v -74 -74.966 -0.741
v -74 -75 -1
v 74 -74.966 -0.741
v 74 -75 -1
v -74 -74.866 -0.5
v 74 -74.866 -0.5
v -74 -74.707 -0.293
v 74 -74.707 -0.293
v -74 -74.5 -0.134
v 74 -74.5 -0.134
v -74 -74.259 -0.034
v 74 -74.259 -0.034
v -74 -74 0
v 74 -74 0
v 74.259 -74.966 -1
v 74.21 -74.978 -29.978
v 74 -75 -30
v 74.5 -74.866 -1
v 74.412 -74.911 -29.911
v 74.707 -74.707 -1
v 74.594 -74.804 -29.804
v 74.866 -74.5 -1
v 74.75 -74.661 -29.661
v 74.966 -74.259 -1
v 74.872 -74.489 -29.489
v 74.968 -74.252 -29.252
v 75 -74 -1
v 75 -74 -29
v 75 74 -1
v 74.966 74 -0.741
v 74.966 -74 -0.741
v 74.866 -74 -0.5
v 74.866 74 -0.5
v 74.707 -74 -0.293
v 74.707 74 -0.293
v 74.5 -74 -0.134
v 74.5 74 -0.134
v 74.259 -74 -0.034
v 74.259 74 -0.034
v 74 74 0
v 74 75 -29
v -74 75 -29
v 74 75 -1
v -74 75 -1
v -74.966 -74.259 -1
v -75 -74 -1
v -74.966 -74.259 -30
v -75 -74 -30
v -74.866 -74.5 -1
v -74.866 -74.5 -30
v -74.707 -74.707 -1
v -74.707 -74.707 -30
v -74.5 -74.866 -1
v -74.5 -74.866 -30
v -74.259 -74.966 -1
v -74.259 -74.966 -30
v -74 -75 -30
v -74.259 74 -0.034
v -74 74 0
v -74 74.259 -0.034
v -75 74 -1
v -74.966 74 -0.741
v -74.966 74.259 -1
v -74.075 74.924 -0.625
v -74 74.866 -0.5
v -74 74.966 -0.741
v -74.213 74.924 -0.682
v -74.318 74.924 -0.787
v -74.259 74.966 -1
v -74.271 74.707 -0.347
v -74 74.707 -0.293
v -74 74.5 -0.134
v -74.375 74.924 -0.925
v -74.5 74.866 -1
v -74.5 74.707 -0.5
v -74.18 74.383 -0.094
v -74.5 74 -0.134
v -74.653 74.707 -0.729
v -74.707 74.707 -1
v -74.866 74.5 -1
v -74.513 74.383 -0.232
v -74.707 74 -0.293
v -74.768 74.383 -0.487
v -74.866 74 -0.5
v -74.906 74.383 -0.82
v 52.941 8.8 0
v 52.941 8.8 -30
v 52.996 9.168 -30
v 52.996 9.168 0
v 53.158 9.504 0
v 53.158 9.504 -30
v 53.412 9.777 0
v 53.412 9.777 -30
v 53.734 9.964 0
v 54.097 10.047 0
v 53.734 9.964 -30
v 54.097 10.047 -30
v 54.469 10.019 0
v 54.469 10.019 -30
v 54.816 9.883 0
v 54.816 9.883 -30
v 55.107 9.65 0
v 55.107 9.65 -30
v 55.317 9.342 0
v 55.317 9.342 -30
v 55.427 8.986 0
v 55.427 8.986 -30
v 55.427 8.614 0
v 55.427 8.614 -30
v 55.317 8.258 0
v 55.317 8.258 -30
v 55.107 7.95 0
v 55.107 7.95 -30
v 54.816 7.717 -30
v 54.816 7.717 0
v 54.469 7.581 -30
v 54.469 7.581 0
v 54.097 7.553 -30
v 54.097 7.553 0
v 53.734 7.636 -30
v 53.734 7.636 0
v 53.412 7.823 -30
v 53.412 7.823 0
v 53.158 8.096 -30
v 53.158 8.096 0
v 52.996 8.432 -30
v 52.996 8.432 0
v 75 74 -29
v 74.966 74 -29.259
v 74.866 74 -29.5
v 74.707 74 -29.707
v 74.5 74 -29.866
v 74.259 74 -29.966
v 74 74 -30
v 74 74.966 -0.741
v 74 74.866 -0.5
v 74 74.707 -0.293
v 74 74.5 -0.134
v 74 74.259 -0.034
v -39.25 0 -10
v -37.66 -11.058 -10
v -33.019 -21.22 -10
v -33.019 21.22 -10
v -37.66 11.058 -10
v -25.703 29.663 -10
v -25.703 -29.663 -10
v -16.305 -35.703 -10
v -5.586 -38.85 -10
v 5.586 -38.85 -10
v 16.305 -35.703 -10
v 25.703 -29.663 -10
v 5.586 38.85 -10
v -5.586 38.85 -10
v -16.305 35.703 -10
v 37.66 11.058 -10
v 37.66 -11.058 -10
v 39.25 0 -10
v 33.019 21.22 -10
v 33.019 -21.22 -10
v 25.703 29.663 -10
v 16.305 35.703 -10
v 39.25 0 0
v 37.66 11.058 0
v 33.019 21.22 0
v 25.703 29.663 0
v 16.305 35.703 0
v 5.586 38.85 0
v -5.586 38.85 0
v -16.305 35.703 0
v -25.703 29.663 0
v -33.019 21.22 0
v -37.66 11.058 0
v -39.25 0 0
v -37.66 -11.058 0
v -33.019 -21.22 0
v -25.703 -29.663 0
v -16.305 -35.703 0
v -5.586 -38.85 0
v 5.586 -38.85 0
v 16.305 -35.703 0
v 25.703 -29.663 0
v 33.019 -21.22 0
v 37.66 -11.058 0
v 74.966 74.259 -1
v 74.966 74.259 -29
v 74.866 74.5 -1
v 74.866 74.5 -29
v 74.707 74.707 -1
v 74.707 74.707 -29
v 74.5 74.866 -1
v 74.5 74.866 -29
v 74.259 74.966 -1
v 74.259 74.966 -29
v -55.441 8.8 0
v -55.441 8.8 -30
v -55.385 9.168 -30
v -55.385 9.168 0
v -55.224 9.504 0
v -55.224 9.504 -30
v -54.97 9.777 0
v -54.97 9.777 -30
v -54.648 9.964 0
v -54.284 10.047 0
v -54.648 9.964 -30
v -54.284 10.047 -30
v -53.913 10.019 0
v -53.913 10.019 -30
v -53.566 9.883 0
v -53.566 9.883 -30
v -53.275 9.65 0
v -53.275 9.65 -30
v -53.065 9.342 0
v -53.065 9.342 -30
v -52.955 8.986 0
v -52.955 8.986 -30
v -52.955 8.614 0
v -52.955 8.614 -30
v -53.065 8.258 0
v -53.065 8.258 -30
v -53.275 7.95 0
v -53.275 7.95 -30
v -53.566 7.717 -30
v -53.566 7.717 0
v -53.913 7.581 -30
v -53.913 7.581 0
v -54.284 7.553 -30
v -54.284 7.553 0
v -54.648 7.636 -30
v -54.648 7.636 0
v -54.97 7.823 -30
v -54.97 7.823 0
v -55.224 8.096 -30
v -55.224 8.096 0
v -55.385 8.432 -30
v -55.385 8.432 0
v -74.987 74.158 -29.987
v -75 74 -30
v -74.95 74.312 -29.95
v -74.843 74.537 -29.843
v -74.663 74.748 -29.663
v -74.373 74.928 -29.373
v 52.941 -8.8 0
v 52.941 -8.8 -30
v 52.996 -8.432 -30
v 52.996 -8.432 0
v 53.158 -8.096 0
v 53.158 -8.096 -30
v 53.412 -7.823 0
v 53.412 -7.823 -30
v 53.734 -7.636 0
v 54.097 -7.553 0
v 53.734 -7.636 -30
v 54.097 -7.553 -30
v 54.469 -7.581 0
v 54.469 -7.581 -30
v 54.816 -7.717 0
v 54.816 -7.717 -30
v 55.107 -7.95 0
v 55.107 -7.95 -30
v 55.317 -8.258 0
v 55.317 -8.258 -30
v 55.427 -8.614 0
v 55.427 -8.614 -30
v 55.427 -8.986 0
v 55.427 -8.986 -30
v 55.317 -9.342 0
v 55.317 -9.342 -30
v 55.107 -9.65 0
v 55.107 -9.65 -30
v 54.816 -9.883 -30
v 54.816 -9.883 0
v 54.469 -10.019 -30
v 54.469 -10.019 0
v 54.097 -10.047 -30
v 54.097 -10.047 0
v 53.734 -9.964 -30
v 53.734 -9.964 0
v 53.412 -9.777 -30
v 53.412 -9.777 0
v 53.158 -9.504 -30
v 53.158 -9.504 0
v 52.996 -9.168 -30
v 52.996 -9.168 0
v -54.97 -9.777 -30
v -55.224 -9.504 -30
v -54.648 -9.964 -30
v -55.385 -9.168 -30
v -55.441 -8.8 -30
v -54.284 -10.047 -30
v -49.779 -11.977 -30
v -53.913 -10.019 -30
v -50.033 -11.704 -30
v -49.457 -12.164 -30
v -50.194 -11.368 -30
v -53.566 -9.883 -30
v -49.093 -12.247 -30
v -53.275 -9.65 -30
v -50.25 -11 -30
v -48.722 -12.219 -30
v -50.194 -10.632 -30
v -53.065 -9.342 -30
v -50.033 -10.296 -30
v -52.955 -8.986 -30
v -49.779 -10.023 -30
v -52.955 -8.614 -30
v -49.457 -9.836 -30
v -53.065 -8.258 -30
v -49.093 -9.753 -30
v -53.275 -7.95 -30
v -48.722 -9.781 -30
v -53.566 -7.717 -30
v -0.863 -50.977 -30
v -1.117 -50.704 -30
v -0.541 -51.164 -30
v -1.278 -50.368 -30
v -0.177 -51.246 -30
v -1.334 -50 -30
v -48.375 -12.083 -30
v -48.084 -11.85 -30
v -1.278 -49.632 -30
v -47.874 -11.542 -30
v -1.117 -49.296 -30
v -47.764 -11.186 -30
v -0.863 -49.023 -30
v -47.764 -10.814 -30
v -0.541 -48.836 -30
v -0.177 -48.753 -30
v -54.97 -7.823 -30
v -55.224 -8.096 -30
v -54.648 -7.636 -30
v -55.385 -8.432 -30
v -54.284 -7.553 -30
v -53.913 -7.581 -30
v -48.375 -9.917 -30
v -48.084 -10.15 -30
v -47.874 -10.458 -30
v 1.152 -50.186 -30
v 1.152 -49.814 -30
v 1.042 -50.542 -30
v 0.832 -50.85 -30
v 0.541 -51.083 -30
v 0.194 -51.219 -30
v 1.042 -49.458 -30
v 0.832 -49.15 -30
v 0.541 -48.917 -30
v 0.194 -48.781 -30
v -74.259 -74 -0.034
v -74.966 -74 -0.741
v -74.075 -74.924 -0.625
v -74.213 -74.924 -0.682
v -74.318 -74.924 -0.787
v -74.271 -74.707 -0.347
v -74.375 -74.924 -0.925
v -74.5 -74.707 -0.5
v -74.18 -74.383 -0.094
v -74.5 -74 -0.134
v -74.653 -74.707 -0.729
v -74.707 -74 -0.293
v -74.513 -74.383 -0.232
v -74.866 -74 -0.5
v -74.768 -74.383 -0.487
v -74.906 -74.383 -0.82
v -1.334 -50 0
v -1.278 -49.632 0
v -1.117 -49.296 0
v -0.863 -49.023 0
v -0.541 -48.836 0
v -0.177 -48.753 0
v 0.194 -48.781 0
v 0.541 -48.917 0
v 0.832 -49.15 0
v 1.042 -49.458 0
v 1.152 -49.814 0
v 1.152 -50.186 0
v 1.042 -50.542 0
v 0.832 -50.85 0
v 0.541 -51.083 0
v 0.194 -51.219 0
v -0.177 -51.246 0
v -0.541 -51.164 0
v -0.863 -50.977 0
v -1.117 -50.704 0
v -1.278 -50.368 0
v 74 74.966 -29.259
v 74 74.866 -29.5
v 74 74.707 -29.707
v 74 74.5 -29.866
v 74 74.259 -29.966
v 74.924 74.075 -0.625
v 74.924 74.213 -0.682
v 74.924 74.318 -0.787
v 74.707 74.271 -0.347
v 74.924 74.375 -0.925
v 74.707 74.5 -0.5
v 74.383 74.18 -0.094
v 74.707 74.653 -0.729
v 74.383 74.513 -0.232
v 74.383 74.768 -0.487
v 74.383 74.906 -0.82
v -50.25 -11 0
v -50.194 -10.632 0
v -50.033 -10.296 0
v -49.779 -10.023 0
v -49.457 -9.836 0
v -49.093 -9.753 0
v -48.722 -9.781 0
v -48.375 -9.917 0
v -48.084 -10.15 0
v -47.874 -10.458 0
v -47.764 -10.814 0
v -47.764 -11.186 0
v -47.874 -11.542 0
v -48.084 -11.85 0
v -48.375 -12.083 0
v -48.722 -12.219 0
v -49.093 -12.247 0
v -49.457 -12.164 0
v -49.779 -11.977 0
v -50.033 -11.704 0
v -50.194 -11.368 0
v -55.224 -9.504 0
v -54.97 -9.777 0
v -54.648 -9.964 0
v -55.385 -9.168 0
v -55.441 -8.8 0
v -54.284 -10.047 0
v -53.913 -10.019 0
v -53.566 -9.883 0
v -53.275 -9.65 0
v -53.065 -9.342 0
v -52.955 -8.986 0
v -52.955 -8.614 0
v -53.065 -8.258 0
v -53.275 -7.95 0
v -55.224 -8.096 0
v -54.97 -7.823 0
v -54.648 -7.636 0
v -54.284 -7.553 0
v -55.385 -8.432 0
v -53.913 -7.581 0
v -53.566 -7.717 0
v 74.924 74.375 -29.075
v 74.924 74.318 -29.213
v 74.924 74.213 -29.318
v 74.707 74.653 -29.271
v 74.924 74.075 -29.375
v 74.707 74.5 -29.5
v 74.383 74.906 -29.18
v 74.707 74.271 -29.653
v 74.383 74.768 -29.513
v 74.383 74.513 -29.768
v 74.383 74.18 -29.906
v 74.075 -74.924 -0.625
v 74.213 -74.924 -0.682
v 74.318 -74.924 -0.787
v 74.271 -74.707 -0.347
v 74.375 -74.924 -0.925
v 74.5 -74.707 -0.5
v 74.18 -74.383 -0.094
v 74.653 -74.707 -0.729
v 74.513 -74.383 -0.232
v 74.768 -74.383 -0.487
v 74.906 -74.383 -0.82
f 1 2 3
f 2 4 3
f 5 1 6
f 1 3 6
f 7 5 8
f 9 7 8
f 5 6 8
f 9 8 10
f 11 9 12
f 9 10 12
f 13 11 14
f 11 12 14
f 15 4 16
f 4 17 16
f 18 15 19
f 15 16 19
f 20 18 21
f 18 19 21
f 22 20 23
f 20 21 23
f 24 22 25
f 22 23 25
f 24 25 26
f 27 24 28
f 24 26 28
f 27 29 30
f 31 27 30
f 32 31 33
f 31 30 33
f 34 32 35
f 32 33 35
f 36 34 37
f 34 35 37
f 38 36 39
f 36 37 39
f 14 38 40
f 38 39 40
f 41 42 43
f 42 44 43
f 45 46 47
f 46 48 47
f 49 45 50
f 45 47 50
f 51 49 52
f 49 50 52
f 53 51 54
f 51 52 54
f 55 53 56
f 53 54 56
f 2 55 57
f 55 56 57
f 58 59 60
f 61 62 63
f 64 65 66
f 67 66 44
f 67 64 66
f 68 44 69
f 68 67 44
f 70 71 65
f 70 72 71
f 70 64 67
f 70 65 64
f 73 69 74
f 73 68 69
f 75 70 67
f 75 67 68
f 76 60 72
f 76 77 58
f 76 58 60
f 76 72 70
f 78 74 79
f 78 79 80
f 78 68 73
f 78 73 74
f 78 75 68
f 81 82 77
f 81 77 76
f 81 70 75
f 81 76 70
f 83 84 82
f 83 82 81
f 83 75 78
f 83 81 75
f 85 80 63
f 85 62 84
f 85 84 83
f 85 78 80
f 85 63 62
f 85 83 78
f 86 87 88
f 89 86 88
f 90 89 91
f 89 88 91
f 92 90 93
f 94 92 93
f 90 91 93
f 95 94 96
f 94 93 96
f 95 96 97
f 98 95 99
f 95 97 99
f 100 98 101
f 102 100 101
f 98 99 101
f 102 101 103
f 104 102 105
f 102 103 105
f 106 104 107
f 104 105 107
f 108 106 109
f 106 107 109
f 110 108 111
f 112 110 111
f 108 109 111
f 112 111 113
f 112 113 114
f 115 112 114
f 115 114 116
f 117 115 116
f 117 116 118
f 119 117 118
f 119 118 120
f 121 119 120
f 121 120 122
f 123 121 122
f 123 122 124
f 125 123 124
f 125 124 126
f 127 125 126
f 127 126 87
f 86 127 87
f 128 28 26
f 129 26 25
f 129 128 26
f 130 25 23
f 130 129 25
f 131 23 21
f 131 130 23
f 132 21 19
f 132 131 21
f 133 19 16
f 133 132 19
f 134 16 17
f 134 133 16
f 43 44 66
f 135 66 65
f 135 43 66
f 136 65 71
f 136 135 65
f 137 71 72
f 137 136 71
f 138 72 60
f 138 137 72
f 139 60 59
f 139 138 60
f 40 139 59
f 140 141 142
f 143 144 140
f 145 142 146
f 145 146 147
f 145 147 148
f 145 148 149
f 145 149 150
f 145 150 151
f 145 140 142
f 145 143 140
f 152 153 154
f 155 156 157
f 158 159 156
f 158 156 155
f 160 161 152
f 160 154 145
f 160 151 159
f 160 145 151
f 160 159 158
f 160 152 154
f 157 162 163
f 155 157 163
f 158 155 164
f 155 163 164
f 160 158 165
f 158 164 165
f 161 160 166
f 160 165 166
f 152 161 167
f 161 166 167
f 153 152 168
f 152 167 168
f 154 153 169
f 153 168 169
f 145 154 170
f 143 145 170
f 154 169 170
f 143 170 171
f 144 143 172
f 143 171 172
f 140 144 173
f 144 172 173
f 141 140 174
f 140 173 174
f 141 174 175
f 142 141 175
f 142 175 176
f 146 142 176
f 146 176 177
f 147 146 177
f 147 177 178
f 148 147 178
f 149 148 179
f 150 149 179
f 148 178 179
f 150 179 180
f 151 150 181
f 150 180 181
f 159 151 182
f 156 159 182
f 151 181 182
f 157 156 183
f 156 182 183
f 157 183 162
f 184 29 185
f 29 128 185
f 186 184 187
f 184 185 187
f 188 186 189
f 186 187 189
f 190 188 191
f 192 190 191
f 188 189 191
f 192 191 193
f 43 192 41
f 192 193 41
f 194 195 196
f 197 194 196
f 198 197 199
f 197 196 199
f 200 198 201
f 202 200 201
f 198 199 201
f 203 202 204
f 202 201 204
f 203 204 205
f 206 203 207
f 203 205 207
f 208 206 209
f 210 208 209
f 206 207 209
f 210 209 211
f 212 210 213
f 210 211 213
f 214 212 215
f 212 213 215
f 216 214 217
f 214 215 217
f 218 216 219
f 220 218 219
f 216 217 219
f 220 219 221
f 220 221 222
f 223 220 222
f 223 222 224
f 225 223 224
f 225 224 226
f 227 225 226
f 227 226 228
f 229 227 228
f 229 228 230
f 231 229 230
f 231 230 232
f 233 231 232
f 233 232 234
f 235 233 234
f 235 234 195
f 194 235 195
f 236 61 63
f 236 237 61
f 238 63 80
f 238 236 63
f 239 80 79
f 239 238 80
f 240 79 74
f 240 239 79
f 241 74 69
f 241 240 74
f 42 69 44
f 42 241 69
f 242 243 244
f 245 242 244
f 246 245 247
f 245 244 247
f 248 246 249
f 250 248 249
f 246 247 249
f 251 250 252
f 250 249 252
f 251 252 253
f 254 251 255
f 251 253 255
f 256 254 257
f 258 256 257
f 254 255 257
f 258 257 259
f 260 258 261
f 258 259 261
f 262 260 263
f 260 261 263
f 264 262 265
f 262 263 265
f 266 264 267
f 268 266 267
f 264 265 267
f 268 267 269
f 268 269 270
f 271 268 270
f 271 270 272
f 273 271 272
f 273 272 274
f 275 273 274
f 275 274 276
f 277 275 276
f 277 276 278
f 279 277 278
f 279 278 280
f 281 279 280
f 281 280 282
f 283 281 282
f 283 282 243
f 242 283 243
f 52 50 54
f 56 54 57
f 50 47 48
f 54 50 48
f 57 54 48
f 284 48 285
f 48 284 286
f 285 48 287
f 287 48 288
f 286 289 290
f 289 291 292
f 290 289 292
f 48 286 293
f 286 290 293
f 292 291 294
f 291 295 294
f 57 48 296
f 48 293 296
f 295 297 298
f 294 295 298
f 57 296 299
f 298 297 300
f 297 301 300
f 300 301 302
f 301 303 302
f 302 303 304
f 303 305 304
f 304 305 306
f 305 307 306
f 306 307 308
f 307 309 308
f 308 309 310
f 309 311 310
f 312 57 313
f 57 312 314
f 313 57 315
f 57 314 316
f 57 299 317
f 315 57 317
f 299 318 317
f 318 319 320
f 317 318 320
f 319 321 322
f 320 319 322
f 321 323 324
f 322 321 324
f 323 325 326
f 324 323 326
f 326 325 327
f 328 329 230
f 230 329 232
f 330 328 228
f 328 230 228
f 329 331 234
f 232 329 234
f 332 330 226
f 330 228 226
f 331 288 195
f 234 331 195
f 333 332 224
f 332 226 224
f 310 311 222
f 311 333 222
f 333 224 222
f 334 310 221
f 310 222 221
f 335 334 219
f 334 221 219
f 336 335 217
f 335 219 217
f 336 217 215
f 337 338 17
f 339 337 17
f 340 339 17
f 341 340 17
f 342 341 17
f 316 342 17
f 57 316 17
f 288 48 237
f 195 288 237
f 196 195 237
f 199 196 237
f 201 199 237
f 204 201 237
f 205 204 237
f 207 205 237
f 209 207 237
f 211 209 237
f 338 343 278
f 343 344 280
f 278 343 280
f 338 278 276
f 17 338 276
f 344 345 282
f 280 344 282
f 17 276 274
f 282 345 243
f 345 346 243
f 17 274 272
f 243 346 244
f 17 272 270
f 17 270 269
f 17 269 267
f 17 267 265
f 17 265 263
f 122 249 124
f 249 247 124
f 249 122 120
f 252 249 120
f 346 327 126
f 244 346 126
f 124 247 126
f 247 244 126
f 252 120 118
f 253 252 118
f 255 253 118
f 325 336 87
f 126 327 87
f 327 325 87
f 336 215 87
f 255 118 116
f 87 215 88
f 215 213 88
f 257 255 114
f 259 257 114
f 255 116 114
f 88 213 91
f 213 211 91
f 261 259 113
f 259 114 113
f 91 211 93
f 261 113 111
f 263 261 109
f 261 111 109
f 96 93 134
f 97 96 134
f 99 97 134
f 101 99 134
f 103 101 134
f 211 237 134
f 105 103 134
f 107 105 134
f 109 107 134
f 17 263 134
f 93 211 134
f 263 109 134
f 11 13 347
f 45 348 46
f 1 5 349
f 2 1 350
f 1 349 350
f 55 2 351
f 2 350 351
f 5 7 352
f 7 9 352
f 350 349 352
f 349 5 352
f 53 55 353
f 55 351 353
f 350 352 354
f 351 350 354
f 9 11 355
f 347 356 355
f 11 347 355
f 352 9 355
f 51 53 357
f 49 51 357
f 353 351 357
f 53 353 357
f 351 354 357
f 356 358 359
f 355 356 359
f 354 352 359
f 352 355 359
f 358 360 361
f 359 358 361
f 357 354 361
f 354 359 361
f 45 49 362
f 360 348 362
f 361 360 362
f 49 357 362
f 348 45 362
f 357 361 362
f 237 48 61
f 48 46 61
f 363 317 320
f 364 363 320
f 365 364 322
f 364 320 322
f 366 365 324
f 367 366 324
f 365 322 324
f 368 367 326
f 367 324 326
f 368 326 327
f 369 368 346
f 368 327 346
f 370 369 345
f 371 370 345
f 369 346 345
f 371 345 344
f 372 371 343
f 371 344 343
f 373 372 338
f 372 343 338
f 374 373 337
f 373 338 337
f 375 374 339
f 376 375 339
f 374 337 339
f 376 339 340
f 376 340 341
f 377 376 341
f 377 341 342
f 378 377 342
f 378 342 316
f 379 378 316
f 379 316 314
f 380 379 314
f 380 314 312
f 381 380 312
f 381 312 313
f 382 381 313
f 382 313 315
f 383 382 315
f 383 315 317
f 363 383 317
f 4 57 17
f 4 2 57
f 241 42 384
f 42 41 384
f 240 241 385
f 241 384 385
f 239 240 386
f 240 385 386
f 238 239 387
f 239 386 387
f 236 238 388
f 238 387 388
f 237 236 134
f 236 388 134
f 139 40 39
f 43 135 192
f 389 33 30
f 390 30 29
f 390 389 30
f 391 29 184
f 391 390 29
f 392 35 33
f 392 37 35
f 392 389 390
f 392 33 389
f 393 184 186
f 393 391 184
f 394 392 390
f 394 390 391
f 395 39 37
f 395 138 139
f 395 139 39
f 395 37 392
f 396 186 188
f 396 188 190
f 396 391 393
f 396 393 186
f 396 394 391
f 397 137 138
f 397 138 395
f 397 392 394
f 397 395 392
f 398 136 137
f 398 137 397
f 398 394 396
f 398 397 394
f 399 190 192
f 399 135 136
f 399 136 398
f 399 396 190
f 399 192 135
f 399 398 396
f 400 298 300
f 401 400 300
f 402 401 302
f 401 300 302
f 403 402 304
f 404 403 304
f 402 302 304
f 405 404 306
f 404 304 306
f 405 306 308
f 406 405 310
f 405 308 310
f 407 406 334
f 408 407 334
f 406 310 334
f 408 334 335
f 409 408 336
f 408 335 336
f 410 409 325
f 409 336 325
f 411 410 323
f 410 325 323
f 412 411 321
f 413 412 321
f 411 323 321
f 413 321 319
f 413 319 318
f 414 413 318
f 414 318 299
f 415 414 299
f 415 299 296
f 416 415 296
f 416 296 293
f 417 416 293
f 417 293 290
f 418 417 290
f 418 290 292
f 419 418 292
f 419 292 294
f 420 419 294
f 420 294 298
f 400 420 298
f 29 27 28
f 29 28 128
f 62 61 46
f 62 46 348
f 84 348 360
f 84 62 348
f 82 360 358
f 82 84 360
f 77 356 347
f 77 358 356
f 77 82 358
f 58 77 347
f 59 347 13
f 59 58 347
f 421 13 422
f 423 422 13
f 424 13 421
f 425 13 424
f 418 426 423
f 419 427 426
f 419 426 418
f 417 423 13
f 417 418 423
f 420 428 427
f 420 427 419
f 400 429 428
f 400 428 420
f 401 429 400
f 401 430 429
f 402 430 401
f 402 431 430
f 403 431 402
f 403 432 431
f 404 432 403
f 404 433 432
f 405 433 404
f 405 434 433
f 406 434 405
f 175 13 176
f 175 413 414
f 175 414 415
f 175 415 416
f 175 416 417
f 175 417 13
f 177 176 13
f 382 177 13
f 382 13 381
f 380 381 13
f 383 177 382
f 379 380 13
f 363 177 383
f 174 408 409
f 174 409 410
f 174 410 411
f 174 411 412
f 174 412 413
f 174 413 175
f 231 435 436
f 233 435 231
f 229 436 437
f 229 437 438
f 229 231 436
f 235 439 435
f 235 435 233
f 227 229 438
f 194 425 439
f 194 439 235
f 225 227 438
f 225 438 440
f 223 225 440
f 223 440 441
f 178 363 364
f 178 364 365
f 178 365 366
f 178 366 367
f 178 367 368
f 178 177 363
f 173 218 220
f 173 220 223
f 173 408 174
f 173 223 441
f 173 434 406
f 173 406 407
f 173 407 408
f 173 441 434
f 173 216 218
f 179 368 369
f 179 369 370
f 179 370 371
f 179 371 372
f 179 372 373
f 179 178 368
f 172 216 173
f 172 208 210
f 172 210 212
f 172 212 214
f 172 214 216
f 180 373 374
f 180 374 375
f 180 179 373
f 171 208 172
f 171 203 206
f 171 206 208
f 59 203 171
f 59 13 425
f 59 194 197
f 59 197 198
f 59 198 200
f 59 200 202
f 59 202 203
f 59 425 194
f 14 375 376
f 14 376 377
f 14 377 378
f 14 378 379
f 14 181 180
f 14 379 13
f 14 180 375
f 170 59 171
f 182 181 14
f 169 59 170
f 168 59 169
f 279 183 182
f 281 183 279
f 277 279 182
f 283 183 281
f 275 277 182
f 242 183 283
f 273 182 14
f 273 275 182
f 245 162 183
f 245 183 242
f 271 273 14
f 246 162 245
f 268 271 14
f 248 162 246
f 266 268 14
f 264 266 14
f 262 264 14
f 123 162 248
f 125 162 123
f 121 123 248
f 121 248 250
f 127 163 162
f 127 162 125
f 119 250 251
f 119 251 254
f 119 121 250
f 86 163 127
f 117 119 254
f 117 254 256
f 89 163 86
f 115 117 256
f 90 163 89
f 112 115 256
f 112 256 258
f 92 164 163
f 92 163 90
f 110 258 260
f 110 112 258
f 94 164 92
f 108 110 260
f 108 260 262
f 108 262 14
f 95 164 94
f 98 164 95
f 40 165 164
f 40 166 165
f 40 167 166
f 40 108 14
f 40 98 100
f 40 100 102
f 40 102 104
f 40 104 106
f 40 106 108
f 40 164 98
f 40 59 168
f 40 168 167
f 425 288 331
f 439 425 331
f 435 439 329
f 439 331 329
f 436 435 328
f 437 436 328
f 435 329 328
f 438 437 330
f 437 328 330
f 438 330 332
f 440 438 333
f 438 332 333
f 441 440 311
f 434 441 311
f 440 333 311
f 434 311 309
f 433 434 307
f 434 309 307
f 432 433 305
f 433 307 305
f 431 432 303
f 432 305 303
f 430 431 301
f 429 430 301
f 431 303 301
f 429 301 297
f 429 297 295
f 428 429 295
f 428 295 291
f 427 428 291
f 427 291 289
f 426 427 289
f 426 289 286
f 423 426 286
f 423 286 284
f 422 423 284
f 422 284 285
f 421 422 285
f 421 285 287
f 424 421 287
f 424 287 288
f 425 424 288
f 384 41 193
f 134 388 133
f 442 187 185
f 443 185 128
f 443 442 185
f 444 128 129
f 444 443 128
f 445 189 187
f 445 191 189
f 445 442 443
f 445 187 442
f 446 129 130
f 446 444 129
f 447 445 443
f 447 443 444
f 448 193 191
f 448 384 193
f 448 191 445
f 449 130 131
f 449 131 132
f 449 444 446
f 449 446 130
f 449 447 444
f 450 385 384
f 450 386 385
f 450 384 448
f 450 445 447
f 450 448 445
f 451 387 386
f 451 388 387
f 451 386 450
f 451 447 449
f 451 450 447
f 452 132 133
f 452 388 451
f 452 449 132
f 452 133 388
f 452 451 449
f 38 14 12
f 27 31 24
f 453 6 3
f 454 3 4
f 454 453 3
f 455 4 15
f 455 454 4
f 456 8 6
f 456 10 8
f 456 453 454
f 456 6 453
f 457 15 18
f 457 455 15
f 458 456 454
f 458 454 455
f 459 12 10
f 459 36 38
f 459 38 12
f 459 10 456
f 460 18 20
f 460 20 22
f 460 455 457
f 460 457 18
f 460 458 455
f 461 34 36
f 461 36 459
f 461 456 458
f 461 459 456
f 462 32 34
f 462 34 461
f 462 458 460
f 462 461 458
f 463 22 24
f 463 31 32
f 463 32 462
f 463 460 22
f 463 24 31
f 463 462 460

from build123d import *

# Parameters (mm, degrees)
SKETCH1_W                   = 150
SKETCH1_H                   = 150
BOSS_EXTRUDE1_DEPTH         = 30
FILLET1_R                   = 1
SKETCH2_R                   = 39.25
CUT_EXTRUDE4_DEPTH          = 10
TAP_DRILL_FOR_M3X0_5_TAP2_D = 2.5
TAP_DRILL_FOR_M3X0_5_TAP3_D = 2.5
TAP_DRILL_FOR_M3X0_5_TAP5_D = 2.5


with BuildPart() as part:
    # Sketch1 → Boss-Extrude1 (new body)
    with BuildSketch(Plane.XY):
        Rectangle(SKETCH1_W, SKETCH1_H)
    extrude(amount=-BOSS_EXTRUDE1_DEPTH)

    # Fillet1
    fillet1_edges = [part.edges().sort_by_distance(p)[0] for p in [
        (0, 75, -30),
        (-75, 0, 0),
        (0, 75, 0),
        (75, 0, 0),
        (0, -75, 0),
        (-75, -75, -15),
        (-75, 75, -15),
        (75, 75, -15),
        (75, -75, -15),
        (75, 0, -30),
    ]]
    fillet(fillet1_edges, radius=FILLET1_R)

    # Sketch2 → Cut-Extrude4 (cut)
    with BuildSketch(Plane.XY):
        Circle(SKETCH2_R)
    extrude(amount=-CUT_EXTRUDE4_DEPTH, mode=Mode.SUBTRACT)

    # Tap Drill for M3x0.5 Tap2 (through all)
    with Locations(Plane.XY):
        with Locations((-54.190883488, -8.8), (-54.190883488, 8.8), (54.190883488, -8.8), (54.190883488, 8.8)):
            Hole(TAP_DRILL_FOR_M3X0_5_TAP2_D / 2)

    # Tap Drill for M3x0.5 Tap3 (through all)
    with Locations(Plane.XY):
        with Locations((-49, -11)):
            Hole(TAP_DRILL_FOR_M3X0_5_TAP3_D / 2)

    # Tap Drill for M3x0.5 Tap5 (through all)
    with Locations(Plane.XY):
        with Locations((-0.083892693, -49.999977478)):
            Hole(TAP_DRILL_FOR_M3X0_5_TAP5_D / 2)


solid = part.part
